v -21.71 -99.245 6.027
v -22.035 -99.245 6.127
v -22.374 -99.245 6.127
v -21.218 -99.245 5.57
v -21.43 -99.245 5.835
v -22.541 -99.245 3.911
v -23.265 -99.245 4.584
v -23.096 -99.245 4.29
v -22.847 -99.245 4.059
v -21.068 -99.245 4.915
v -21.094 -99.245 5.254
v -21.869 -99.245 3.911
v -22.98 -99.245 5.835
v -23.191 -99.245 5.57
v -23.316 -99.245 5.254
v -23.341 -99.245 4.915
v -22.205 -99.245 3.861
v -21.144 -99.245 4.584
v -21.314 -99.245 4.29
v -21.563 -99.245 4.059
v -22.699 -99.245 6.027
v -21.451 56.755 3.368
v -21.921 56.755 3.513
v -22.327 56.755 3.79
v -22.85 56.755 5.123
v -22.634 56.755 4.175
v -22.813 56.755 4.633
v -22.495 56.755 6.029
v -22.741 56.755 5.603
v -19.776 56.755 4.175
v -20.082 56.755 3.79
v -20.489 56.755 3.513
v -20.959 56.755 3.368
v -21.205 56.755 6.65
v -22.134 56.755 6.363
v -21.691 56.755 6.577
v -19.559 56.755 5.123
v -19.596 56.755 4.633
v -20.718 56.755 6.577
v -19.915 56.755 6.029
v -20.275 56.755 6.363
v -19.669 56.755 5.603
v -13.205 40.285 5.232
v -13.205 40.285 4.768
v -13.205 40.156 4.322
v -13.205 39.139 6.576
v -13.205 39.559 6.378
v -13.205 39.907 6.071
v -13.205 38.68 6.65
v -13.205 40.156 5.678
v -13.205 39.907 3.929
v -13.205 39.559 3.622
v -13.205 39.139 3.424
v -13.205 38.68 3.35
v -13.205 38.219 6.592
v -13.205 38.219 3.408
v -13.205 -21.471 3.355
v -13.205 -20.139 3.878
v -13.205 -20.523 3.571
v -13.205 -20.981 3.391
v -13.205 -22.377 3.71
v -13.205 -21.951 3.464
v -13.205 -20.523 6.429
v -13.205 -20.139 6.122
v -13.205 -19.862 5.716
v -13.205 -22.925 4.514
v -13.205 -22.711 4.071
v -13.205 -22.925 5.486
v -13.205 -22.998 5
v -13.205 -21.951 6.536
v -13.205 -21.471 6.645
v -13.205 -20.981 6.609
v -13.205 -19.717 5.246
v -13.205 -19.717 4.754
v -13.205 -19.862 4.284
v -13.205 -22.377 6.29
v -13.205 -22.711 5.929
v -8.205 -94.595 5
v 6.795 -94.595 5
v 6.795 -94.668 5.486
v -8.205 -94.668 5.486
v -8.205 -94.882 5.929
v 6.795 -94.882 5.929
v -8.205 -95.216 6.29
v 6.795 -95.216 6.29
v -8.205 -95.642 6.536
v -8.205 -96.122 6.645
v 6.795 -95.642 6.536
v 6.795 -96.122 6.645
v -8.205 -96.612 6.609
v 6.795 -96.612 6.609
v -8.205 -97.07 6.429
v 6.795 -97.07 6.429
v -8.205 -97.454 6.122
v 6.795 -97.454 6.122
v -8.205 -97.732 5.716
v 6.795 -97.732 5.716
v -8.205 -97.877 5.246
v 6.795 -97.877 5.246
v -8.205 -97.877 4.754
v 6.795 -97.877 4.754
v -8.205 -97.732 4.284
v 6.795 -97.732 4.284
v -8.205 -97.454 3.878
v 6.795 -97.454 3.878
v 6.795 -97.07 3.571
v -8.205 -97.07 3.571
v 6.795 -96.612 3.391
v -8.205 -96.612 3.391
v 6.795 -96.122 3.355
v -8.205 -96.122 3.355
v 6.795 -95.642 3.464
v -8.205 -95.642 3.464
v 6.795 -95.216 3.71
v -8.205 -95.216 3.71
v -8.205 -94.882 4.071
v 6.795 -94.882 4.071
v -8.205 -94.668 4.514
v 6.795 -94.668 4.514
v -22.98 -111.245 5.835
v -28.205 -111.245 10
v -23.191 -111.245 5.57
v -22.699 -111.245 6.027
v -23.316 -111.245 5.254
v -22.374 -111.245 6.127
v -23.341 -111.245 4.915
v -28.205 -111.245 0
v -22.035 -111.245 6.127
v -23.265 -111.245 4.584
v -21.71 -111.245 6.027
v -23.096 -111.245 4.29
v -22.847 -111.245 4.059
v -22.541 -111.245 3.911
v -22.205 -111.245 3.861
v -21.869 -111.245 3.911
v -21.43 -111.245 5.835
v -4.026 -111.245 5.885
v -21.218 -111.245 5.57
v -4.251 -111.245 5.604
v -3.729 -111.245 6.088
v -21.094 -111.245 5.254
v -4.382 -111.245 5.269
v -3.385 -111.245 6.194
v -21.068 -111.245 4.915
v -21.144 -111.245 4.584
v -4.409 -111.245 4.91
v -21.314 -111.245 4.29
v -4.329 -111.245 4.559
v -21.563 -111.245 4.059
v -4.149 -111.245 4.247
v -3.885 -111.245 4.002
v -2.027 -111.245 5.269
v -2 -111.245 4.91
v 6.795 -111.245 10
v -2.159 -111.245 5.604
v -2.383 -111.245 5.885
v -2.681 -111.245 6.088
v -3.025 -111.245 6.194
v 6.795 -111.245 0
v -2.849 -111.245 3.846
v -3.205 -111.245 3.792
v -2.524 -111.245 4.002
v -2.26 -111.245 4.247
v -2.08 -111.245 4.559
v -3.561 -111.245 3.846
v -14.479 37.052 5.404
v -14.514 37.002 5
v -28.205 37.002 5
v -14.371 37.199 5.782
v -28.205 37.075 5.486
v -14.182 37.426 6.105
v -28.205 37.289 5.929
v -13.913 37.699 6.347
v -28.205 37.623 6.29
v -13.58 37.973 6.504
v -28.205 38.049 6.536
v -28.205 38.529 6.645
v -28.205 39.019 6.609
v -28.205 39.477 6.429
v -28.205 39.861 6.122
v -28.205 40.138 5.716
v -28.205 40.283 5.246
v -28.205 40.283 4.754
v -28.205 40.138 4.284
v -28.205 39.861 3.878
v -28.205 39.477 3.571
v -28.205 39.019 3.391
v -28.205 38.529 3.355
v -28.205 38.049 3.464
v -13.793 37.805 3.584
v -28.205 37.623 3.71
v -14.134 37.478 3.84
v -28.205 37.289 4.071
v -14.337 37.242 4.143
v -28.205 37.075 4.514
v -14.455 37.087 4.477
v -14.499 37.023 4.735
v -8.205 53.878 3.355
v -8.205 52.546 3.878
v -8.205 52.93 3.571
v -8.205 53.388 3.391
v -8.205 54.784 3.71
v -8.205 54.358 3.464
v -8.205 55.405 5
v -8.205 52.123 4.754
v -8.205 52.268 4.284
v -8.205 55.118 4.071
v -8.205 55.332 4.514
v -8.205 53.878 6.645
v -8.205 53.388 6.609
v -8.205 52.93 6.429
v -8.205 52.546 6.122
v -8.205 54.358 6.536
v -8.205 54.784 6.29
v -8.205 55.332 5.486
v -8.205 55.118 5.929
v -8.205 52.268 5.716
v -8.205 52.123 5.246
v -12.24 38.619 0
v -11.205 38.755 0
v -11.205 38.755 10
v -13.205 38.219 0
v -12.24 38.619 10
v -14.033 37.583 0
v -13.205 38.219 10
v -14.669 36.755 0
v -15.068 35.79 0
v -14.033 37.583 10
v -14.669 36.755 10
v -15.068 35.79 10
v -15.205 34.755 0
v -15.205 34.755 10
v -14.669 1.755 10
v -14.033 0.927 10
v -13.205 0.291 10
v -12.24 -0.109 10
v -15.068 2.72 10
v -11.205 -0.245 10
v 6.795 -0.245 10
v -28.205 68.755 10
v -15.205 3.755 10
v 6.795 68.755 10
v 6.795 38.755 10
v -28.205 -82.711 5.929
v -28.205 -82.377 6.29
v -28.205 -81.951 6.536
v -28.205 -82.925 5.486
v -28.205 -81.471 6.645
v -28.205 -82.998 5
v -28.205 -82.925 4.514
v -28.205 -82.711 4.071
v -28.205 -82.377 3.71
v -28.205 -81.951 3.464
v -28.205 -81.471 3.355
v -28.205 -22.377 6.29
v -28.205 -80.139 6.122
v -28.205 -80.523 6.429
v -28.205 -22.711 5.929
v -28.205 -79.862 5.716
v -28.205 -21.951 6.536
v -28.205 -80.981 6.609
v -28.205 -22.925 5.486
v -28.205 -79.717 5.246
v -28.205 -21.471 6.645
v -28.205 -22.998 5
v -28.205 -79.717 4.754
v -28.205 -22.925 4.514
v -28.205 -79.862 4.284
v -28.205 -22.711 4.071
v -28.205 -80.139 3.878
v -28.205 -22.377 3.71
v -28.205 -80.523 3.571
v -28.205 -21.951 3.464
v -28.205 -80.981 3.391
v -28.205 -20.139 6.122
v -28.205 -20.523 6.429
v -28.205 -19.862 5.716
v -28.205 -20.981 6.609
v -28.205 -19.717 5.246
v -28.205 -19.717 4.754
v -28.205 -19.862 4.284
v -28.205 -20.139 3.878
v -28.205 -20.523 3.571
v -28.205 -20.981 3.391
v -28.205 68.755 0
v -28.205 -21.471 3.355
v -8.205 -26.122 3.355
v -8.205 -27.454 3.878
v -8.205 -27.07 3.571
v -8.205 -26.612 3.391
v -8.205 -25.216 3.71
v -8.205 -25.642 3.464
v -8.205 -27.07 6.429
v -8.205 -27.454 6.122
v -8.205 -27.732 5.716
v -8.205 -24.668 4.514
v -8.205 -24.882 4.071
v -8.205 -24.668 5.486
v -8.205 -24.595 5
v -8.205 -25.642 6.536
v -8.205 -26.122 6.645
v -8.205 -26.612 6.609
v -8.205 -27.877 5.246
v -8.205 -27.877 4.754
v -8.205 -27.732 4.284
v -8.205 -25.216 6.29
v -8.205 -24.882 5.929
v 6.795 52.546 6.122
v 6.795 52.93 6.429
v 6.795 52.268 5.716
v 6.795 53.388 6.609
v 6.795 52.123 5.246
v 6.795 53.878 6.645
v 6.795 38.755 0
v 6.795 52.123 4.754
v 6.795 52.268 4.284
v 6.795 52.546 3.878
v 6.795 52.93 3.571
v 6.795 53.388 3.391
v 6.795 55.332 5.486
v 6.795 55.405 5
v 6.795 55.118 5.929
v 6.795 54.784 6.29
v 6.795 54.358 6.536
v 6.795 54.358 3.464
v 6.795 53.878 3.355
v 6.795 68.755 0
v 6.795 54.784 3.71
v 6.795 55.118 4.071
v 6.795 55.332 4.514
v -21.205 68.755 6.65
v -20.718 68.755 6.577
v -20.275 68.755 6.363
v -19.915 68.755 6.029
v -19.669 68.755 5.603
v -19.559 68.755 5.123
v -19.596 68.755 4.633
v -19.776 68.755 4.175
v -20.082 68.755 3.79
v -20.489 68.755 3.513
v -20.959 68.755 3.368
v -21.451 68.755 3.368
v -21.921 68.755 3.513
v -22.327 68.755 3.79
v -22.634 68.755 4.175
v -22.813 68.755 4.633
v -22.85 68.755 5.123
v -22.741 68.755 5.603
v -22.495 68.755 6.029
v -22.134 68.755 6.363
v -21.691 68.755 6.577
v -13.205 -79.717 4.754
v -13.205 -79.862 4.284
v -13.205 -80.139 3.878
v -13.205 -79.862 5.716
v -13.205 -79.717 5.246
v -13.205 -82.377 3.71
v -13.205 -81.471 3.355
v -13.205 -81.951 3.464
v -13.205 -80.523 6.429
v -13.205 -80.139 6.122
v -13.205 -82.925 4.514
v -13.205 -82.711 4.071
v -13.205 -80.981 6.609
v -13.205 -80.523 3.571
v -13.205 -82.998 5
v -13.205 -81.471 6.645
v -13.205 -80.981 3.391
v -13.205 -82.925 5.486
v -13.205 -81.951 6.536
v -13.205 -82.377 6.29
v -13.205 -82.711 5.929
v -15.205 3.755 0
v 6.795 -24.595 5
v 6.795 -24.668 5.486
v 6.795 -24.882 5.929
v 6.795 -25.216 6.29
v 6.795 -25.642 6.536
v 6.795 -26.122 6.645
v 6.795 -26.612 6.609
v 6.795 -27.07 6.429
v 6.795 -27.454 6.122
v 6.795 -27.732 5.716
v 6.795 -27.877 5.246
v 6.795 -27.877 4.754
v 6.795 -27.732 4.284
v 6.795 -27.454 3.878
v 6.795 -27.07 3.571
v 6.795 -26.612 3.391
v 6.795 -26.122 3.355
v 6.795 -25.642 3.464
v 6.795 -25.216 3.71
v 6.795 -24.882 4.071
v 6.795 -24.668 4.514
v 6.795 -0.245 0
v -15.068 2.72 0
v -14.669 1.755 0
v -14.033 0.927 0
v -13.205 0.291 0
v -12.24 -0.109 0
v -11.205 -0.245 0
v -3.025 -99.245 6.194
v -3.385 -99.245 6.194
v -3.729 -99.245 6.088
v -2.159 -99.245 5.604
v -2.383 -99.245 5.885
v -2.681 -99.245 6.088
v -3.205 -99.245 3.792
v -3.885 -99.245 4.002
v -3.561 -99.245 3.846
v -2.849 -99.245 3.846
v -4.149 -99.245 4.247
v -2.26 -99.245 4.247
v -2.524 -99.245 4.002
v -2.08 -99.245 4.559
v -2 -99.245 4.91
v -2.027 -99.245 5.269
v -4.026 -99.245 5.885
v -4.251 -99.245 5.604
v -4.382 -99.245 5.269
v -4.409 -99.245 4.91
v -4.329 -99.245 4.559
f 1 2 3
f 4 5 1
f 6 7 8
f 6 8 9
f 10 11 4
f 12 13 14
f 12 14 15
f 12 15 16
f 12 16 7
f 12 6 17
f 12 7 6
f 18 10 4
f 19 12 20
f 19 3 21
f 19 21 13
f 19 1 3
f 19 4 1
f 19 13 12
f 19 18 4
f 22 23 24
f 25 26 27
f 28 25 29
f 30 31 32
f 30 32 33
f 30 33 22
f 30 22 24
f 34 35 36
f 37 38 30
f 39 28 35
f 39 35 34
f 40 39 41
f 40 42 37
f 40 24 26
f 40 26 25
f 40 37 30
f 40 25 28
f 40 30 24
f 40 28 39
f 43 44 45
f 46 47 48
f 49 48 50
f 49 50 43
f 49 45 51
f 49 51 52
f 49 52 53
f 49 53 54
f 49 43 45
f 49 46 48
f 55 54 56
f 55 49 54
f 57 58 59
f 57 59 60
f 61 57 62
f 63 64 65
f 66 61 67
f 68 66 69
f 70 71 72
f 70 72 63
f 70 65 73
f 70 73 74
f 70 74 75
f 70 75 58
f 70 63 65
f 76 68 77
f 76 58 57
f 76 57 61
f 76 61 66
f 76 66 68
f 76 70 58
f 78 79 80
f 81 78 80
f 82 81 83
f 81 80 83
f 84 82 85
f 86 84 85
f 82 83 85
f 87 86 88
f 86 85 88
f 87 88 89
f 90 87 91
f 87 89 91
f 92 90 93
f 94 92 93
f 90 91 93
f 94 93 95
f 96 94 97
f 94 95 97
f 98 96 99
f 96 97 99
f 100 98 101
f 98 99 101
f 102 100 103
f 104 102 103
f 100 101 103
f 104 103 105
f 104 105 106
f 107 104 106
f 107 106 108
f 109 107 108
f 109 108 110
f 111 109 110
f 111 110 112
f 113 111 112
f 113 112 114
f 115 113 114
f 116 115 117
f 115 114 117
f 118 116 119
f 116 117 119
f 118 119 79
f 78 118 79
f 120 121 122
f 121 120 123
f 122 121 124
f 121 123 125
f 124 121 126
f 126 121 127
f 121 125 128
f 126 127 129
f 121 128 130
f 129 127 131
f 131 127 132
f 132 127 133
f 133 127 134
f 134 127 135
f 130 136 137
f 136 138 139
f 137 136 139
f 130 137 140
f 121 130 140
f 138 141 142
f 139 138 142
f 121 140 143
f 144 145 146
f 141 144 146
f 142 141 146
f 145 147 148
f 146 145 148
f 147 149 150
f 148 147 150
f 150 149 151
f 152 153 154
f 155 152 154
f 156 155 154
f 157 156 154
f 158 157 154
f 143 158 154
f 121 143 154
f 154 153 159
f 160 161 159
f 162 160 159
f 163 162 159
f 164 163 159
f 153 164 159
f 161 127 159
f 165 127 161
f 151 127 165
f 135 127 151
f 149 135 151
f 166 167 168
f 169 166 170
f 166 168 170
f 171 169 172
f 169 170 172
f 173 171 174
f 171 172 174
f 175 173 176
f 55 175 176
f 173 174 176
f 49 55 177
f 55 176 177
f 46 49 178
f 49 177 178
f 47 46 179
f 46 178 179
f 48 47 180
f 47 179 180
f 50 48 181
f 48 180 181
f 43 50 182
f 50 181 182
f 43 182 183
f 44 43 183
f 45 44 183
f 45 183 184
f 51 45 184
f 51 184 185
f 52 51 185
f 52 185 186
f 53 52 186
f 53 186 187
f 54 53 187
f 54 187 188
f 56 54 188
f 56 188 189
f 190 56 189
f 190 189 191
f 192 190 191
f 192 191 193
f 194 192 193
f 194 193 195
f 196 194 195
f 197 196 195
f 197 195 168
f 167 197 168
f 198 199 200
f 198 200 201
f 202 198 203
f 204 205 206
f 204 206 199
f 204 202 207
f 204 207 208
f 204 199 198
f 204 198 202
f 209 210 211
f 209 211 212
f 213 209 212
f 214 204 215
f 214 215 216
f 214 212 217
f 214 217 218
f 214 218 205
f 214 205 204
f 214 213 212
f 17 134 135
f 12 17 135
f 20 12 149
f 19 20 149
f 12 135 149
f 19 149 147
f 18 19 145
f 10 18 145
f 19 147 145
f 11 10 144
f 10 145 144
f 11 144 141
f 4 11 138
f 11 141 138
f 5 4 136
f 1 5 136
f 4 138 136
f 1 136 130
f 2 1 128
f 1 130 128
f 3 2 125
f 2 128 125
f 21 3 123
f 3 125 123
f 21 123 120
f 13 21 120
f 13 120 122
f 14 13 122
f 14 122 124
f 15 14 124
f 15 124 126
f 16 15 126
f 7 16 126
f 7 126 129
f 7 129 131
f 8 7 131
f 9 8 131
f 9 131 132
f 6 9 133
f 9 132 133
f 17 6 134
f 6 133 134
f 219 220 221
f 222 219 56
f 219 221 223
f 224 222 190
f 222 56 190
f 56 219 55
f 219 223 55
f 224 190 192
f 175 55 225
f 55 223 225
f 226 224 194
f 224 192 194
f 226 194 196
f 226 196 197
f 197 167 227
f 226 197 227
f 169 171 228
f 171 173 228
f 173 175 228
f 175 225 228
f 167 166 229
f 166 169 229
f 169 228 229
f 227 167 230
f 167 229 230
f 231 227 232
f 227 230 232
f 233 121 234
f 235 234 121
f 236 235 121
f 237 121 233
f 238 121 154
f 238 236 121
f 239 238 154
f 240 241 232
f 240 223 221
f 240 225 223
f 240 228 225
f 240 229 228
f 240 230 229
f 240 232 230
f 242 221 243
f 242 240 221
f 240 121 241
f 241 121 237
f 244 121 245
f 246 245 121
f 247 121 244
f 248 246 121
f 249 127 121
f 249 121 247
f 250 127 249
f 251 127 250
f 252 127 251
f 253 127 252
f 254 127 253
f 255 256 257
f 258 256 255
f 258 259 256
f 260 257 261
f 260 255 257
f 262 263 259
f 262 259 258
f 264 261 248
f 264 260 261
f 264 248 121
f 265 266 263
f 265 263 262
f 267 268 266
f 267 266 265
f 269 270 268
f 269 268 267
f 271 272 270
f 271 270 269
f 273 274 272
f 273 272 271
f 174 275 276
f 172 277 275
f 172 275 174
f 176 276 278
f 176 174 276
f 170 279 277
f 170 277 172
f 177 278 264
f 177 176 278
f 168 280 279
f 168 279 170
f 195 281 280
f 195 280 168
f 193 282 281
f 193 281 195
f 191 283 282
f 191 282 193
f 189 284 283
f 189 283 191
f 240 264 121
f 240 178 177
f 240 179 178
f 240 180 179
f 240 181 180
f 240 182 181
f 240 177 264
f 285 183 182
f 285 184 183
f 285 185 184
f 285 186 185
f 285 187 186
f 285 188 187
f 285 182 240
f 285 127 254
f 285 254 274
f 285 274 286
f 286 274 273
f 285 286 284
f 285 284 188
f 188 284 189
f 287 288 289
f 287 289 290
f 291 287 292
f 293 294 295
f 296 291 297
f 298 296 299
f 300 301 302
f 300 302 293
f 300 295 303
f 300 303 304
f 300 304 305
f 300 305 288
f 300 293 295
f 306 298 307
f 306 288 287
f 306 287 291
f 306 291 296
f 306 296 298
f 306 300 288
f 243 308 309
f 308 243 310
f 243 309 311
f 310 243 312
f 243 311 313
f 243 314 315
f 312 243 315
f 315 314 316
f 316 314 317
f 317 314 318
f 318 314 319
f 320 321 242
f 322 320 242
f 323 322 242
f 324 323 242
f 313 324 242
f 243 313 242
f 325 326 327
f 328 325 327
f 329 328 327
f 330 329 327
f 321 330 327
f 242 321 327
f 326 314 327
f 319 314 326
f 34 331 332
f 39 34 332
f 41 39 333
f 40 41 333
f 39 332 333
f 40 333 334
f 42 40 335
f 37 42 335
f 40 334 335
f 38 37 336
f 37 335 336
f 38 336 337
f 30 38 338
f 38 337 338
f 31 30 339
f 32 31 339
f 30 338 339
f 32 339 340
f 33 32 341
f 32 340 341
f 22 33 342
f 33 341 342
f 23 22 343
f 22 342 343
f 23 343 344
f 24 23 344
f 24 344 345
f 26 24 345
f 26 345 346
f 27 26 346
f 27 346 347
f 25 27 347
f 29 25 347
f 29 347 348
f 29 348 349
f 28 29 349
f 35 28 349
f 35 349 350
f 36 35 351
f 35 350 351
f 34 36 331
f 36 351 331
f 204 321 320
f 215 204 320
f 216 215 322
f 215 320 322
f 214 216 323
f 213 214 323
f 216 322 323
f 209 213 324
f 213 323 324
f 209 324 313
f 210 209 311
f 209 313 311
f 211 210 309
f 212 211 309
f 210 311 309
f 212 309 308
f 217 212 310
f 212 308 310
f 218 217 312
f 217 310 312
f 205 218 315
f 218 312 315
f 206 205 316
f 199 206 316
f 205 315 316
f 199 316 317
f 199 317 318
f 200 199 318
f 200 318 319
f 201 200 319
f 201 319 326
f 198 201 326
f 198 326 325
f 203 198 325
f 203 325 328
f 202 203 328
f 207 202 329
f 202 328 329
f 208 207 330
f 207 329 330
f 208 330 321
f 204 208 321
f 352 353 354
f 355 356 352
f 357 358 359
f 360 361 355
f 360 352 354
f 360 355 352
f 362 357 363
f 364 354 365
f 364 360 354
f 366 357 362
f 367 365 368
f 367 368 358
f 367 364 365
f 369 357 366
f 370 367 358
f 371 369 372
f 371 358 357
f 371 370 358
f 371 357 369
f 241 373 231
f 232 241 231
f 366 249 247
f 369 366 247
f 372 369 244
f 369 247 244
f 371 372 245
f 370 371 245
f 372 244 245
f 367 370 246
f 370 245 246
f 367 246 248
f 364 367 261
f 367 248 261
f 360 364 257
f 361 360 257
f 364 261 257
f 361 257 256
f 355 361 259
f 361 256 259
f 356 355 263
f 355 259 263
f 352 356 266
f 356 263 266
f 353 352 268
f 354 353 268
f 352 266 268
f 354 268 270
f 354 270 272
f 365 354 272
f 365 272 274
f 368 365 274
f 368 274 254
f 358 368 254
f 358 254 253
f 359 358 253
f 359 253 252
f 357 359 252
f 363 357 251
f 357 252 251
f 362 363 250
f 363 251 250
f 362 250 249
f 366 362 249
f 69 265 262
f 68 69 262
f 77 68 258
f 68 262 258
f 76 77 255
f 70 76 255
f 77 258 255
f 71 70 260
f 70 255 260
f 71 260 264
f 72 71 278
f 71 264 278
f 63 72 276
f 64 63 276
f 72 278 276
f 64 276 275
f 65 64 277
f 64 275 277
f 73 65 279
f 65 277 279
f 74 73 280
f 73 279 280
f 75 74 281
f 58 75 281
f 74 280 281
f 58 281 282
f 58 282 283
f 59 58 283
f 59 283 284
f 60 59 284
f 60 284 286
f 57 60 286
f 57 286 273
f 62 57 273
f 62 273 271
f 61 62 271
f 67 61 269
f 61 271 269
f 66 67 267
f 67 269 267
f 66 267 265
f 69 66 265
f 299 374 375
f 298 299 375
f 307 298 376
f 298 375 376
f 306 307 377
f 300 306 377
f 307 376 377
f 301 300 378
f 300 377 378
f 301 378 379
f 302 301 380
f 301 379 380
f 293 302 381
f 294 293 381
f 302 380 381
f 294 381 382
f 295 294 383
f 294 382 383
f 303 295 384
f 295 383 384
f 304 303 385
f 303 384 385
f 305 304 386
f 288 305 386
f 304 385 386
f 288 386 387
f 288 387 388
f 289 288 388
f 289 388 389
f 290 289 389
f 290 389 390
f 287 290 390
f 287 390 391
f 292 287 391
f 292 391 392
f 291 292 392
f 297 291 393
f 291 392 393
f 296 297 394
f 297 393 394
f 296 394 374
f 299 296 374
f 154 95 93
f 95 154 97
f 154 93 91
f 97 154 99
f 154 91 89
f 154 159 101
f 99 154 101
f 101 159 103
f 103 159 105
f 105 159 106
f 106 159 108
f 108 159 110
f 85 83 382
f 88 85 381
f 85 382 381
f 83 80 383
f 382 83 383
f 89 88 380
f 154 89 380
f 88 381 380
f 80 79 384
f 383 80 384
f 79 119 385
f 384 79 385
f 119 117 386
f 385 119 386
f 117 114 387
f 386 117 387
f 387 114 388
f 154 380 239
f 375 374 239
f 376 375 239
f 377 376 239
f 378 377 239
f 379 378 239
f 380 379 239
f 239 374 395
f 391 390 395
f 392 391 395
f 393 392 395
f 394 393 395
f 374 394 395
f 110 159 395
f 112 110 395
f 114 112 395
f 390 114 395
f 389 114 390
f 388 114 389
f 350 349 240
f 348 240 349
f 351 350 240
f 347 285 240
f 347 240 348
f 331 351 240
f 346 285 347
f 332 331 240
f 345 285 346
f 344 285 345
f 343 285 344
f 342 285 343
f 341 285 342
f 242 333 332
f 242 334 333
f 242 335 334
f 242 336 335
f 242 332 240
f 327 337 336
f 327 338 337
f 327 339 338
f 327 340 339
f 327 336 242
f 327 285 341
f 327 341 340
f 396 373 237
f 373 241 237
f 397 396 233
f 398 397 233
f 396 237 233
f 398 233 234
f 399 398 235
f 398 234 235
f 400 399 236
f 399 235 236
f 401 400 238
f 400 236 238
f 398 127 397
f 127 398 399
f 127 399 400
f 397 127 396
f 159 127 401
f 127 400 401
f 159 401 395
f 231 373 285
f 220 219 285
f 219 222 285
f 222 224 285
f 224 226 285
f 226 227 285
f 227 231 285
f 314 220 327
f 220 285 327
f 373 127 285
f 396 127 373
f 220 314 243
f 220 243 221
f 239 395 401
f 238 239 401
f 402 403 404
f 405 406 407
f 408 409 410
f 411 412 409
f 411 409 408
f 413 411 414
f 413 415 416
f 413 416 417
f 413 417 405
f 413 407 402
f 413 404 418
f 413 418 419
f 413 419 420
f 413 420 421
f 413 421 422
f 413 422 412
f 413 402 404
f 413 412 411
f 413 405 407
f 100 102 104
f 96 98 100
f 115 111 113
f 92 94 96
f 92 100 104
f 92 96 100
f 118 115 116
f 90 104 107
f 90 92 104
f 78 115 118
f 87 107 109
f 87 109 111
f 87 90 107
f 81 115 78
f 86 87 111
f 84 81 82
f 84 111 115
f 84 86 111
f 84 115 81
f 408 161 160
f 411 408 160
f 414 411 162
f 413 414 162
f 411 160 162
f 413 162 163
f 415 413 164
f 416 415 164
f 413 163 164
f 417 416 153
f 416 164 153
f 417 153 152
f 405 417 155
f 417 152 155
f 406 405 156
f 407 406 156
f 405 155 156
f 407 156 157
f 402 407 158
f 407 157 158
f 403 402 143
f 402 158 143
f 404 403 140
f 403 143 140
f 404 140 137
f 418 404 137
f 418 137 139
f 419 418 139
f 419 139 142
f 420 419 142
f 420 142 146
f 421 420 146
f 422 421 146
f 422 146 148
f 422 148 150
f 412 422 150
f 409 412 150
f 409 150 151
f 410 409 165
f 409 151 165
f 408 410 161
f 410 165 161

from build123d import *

# Parameters (mm, degrees)
SKETCH_1_W          = 35
SKETCH_1_H          = 180
EXTRUDE_1_DEPTH     = 10
SKETCH_2_W          = 22
SKETCH_2_H          = 39
CUT_EXTRUDE_1_DEPTH = 39
FILLET_1_R          = 4
SKETCH_3_R          = 1.65
CUT_EXTRUDE_2_DEPTH = 15
SKETCH_5_R          = 1.65
CUT_EXTRUDE_3_DEPTH = 15
SKETCH_6_R          = 1.139472941
SKETCH_6_R_2        = 1.207913295
CUT_EXTRUDE_4_DEPTH = 12
SKETCH_7_R          = 1.65
CUT_EXTRUDE_5_DEPTH = 12


with BuildPart() as part:
    # Эскиз1 → Бобышка-Вытянуть1 (new body)
    with BuildSketch(Plane.XY):
        with Locations((-10.704653715, -21.244958968)):
            Rectangle(SKETCH_1_W, SKETCH_1_H)
    extrude(amount=EXTRUDE_1_DEPTH)

    # Эскиз2 → Вырез-Вытянуть1 (cut)
    with BuildSketch(Plane(origin=(0, 0, 0), x_dir=(-1, 0, 0), z_dir=(0, 0, -1))):
        with Locations((4.204653715, 19.255041032)):
            Rectangle(SKETCH_2_W, SKETCH_2_H)
    extrude(amount=-CUT_EXTRUDE_1_DEPTH, mode=Mode.SUBTRACT)

    # Скругление1
    fillet_1_edges = [part.edges().sort_by_distance(p)[0] for p in [
        (-15.204653715, 38.755041032, 5),
        (-15.204653715, -0.244958968, 5),
    ]]
    fillet(fillet_1_edges, radius=FILLET_1_R)

    # Эскиз3 → Вырез-Вытянуть2 (cut)
    with BuildSketch(Plane.ZY.offset(28.204653715)):
        with Locations(Location((5, 38.651818595, 0), (0, 0, 270))):
            Circle(SKETCH_3_R)
        with Locations(Location((5, -21.348181405, 0), (0, 0, 270))):
            Circle(SKETCH_3_R)
        with Locations(Location((5, -81.348181405, 0), (0, 0, 270))):
            Circle(SKETCH_3_R)
    extrude(amount=-CUT_EXTRUDE_2_DEPTH, mode=Mode.SUBTRACT)

    # Эскиз5 → Вырез-Вытянуть3 (cut)
    with BuildSketch(Plane(origin=(6.795346285, 0, 0), x_dir=(0, 0, -1), z_dir=(1, 0, 0))):
        with Locations(Location((-5, 53.755041032, 0), (0, 0, 90))):
            Circle(SKETCH_5_R)
        with Locations(Location((-5, -26.244958968, 0), (0, 0, 90))):
            Circle(SKETCH_5_R)
        with Locations(Location((-5, -96.244958968, 0), (0, 0, 90))):
            Circle(SKETCH_5_R)
    extrude(amount=-CUT_EXTRUDE_3_DEPTH, mode=Mode.SUBTRACT)

    # Эскиз6 → Вырез-Вытянуть4 (cut)
    with BuildSketch(Plane.XZ.offset(111.244958968)):
        with Locations(Location((-22.204653715, 5, 0), (0, 0, 270))):
            Circle(SKETCH_6_R)
        with Locations(Location((-3.204653715, 5, 0), (0, 0, 270))):
            Circle(SKETCH_6_R_2)
    extrude(amount=-CUT_EXTRUDE_4_DEPTH, mode=Mode.SUBTRACT)

    # Эскиз7 → Вырез-Вытянуть5 (cut)
    with BuildSketch(Plane(origin=(0, 68.755041032, 0), x_dir=(1, 0, 0), z_dir=(0, 1, 0))):
        with Locations(Location((-21.204653715, -5, 0), (0, 0, 270))):
            Circle(SKETCH_7_R)
    extrude(amount=-CUT_EXTRUDE_5_DEPTH, mode=Mode.SUBTRACT)


solid = part.part
